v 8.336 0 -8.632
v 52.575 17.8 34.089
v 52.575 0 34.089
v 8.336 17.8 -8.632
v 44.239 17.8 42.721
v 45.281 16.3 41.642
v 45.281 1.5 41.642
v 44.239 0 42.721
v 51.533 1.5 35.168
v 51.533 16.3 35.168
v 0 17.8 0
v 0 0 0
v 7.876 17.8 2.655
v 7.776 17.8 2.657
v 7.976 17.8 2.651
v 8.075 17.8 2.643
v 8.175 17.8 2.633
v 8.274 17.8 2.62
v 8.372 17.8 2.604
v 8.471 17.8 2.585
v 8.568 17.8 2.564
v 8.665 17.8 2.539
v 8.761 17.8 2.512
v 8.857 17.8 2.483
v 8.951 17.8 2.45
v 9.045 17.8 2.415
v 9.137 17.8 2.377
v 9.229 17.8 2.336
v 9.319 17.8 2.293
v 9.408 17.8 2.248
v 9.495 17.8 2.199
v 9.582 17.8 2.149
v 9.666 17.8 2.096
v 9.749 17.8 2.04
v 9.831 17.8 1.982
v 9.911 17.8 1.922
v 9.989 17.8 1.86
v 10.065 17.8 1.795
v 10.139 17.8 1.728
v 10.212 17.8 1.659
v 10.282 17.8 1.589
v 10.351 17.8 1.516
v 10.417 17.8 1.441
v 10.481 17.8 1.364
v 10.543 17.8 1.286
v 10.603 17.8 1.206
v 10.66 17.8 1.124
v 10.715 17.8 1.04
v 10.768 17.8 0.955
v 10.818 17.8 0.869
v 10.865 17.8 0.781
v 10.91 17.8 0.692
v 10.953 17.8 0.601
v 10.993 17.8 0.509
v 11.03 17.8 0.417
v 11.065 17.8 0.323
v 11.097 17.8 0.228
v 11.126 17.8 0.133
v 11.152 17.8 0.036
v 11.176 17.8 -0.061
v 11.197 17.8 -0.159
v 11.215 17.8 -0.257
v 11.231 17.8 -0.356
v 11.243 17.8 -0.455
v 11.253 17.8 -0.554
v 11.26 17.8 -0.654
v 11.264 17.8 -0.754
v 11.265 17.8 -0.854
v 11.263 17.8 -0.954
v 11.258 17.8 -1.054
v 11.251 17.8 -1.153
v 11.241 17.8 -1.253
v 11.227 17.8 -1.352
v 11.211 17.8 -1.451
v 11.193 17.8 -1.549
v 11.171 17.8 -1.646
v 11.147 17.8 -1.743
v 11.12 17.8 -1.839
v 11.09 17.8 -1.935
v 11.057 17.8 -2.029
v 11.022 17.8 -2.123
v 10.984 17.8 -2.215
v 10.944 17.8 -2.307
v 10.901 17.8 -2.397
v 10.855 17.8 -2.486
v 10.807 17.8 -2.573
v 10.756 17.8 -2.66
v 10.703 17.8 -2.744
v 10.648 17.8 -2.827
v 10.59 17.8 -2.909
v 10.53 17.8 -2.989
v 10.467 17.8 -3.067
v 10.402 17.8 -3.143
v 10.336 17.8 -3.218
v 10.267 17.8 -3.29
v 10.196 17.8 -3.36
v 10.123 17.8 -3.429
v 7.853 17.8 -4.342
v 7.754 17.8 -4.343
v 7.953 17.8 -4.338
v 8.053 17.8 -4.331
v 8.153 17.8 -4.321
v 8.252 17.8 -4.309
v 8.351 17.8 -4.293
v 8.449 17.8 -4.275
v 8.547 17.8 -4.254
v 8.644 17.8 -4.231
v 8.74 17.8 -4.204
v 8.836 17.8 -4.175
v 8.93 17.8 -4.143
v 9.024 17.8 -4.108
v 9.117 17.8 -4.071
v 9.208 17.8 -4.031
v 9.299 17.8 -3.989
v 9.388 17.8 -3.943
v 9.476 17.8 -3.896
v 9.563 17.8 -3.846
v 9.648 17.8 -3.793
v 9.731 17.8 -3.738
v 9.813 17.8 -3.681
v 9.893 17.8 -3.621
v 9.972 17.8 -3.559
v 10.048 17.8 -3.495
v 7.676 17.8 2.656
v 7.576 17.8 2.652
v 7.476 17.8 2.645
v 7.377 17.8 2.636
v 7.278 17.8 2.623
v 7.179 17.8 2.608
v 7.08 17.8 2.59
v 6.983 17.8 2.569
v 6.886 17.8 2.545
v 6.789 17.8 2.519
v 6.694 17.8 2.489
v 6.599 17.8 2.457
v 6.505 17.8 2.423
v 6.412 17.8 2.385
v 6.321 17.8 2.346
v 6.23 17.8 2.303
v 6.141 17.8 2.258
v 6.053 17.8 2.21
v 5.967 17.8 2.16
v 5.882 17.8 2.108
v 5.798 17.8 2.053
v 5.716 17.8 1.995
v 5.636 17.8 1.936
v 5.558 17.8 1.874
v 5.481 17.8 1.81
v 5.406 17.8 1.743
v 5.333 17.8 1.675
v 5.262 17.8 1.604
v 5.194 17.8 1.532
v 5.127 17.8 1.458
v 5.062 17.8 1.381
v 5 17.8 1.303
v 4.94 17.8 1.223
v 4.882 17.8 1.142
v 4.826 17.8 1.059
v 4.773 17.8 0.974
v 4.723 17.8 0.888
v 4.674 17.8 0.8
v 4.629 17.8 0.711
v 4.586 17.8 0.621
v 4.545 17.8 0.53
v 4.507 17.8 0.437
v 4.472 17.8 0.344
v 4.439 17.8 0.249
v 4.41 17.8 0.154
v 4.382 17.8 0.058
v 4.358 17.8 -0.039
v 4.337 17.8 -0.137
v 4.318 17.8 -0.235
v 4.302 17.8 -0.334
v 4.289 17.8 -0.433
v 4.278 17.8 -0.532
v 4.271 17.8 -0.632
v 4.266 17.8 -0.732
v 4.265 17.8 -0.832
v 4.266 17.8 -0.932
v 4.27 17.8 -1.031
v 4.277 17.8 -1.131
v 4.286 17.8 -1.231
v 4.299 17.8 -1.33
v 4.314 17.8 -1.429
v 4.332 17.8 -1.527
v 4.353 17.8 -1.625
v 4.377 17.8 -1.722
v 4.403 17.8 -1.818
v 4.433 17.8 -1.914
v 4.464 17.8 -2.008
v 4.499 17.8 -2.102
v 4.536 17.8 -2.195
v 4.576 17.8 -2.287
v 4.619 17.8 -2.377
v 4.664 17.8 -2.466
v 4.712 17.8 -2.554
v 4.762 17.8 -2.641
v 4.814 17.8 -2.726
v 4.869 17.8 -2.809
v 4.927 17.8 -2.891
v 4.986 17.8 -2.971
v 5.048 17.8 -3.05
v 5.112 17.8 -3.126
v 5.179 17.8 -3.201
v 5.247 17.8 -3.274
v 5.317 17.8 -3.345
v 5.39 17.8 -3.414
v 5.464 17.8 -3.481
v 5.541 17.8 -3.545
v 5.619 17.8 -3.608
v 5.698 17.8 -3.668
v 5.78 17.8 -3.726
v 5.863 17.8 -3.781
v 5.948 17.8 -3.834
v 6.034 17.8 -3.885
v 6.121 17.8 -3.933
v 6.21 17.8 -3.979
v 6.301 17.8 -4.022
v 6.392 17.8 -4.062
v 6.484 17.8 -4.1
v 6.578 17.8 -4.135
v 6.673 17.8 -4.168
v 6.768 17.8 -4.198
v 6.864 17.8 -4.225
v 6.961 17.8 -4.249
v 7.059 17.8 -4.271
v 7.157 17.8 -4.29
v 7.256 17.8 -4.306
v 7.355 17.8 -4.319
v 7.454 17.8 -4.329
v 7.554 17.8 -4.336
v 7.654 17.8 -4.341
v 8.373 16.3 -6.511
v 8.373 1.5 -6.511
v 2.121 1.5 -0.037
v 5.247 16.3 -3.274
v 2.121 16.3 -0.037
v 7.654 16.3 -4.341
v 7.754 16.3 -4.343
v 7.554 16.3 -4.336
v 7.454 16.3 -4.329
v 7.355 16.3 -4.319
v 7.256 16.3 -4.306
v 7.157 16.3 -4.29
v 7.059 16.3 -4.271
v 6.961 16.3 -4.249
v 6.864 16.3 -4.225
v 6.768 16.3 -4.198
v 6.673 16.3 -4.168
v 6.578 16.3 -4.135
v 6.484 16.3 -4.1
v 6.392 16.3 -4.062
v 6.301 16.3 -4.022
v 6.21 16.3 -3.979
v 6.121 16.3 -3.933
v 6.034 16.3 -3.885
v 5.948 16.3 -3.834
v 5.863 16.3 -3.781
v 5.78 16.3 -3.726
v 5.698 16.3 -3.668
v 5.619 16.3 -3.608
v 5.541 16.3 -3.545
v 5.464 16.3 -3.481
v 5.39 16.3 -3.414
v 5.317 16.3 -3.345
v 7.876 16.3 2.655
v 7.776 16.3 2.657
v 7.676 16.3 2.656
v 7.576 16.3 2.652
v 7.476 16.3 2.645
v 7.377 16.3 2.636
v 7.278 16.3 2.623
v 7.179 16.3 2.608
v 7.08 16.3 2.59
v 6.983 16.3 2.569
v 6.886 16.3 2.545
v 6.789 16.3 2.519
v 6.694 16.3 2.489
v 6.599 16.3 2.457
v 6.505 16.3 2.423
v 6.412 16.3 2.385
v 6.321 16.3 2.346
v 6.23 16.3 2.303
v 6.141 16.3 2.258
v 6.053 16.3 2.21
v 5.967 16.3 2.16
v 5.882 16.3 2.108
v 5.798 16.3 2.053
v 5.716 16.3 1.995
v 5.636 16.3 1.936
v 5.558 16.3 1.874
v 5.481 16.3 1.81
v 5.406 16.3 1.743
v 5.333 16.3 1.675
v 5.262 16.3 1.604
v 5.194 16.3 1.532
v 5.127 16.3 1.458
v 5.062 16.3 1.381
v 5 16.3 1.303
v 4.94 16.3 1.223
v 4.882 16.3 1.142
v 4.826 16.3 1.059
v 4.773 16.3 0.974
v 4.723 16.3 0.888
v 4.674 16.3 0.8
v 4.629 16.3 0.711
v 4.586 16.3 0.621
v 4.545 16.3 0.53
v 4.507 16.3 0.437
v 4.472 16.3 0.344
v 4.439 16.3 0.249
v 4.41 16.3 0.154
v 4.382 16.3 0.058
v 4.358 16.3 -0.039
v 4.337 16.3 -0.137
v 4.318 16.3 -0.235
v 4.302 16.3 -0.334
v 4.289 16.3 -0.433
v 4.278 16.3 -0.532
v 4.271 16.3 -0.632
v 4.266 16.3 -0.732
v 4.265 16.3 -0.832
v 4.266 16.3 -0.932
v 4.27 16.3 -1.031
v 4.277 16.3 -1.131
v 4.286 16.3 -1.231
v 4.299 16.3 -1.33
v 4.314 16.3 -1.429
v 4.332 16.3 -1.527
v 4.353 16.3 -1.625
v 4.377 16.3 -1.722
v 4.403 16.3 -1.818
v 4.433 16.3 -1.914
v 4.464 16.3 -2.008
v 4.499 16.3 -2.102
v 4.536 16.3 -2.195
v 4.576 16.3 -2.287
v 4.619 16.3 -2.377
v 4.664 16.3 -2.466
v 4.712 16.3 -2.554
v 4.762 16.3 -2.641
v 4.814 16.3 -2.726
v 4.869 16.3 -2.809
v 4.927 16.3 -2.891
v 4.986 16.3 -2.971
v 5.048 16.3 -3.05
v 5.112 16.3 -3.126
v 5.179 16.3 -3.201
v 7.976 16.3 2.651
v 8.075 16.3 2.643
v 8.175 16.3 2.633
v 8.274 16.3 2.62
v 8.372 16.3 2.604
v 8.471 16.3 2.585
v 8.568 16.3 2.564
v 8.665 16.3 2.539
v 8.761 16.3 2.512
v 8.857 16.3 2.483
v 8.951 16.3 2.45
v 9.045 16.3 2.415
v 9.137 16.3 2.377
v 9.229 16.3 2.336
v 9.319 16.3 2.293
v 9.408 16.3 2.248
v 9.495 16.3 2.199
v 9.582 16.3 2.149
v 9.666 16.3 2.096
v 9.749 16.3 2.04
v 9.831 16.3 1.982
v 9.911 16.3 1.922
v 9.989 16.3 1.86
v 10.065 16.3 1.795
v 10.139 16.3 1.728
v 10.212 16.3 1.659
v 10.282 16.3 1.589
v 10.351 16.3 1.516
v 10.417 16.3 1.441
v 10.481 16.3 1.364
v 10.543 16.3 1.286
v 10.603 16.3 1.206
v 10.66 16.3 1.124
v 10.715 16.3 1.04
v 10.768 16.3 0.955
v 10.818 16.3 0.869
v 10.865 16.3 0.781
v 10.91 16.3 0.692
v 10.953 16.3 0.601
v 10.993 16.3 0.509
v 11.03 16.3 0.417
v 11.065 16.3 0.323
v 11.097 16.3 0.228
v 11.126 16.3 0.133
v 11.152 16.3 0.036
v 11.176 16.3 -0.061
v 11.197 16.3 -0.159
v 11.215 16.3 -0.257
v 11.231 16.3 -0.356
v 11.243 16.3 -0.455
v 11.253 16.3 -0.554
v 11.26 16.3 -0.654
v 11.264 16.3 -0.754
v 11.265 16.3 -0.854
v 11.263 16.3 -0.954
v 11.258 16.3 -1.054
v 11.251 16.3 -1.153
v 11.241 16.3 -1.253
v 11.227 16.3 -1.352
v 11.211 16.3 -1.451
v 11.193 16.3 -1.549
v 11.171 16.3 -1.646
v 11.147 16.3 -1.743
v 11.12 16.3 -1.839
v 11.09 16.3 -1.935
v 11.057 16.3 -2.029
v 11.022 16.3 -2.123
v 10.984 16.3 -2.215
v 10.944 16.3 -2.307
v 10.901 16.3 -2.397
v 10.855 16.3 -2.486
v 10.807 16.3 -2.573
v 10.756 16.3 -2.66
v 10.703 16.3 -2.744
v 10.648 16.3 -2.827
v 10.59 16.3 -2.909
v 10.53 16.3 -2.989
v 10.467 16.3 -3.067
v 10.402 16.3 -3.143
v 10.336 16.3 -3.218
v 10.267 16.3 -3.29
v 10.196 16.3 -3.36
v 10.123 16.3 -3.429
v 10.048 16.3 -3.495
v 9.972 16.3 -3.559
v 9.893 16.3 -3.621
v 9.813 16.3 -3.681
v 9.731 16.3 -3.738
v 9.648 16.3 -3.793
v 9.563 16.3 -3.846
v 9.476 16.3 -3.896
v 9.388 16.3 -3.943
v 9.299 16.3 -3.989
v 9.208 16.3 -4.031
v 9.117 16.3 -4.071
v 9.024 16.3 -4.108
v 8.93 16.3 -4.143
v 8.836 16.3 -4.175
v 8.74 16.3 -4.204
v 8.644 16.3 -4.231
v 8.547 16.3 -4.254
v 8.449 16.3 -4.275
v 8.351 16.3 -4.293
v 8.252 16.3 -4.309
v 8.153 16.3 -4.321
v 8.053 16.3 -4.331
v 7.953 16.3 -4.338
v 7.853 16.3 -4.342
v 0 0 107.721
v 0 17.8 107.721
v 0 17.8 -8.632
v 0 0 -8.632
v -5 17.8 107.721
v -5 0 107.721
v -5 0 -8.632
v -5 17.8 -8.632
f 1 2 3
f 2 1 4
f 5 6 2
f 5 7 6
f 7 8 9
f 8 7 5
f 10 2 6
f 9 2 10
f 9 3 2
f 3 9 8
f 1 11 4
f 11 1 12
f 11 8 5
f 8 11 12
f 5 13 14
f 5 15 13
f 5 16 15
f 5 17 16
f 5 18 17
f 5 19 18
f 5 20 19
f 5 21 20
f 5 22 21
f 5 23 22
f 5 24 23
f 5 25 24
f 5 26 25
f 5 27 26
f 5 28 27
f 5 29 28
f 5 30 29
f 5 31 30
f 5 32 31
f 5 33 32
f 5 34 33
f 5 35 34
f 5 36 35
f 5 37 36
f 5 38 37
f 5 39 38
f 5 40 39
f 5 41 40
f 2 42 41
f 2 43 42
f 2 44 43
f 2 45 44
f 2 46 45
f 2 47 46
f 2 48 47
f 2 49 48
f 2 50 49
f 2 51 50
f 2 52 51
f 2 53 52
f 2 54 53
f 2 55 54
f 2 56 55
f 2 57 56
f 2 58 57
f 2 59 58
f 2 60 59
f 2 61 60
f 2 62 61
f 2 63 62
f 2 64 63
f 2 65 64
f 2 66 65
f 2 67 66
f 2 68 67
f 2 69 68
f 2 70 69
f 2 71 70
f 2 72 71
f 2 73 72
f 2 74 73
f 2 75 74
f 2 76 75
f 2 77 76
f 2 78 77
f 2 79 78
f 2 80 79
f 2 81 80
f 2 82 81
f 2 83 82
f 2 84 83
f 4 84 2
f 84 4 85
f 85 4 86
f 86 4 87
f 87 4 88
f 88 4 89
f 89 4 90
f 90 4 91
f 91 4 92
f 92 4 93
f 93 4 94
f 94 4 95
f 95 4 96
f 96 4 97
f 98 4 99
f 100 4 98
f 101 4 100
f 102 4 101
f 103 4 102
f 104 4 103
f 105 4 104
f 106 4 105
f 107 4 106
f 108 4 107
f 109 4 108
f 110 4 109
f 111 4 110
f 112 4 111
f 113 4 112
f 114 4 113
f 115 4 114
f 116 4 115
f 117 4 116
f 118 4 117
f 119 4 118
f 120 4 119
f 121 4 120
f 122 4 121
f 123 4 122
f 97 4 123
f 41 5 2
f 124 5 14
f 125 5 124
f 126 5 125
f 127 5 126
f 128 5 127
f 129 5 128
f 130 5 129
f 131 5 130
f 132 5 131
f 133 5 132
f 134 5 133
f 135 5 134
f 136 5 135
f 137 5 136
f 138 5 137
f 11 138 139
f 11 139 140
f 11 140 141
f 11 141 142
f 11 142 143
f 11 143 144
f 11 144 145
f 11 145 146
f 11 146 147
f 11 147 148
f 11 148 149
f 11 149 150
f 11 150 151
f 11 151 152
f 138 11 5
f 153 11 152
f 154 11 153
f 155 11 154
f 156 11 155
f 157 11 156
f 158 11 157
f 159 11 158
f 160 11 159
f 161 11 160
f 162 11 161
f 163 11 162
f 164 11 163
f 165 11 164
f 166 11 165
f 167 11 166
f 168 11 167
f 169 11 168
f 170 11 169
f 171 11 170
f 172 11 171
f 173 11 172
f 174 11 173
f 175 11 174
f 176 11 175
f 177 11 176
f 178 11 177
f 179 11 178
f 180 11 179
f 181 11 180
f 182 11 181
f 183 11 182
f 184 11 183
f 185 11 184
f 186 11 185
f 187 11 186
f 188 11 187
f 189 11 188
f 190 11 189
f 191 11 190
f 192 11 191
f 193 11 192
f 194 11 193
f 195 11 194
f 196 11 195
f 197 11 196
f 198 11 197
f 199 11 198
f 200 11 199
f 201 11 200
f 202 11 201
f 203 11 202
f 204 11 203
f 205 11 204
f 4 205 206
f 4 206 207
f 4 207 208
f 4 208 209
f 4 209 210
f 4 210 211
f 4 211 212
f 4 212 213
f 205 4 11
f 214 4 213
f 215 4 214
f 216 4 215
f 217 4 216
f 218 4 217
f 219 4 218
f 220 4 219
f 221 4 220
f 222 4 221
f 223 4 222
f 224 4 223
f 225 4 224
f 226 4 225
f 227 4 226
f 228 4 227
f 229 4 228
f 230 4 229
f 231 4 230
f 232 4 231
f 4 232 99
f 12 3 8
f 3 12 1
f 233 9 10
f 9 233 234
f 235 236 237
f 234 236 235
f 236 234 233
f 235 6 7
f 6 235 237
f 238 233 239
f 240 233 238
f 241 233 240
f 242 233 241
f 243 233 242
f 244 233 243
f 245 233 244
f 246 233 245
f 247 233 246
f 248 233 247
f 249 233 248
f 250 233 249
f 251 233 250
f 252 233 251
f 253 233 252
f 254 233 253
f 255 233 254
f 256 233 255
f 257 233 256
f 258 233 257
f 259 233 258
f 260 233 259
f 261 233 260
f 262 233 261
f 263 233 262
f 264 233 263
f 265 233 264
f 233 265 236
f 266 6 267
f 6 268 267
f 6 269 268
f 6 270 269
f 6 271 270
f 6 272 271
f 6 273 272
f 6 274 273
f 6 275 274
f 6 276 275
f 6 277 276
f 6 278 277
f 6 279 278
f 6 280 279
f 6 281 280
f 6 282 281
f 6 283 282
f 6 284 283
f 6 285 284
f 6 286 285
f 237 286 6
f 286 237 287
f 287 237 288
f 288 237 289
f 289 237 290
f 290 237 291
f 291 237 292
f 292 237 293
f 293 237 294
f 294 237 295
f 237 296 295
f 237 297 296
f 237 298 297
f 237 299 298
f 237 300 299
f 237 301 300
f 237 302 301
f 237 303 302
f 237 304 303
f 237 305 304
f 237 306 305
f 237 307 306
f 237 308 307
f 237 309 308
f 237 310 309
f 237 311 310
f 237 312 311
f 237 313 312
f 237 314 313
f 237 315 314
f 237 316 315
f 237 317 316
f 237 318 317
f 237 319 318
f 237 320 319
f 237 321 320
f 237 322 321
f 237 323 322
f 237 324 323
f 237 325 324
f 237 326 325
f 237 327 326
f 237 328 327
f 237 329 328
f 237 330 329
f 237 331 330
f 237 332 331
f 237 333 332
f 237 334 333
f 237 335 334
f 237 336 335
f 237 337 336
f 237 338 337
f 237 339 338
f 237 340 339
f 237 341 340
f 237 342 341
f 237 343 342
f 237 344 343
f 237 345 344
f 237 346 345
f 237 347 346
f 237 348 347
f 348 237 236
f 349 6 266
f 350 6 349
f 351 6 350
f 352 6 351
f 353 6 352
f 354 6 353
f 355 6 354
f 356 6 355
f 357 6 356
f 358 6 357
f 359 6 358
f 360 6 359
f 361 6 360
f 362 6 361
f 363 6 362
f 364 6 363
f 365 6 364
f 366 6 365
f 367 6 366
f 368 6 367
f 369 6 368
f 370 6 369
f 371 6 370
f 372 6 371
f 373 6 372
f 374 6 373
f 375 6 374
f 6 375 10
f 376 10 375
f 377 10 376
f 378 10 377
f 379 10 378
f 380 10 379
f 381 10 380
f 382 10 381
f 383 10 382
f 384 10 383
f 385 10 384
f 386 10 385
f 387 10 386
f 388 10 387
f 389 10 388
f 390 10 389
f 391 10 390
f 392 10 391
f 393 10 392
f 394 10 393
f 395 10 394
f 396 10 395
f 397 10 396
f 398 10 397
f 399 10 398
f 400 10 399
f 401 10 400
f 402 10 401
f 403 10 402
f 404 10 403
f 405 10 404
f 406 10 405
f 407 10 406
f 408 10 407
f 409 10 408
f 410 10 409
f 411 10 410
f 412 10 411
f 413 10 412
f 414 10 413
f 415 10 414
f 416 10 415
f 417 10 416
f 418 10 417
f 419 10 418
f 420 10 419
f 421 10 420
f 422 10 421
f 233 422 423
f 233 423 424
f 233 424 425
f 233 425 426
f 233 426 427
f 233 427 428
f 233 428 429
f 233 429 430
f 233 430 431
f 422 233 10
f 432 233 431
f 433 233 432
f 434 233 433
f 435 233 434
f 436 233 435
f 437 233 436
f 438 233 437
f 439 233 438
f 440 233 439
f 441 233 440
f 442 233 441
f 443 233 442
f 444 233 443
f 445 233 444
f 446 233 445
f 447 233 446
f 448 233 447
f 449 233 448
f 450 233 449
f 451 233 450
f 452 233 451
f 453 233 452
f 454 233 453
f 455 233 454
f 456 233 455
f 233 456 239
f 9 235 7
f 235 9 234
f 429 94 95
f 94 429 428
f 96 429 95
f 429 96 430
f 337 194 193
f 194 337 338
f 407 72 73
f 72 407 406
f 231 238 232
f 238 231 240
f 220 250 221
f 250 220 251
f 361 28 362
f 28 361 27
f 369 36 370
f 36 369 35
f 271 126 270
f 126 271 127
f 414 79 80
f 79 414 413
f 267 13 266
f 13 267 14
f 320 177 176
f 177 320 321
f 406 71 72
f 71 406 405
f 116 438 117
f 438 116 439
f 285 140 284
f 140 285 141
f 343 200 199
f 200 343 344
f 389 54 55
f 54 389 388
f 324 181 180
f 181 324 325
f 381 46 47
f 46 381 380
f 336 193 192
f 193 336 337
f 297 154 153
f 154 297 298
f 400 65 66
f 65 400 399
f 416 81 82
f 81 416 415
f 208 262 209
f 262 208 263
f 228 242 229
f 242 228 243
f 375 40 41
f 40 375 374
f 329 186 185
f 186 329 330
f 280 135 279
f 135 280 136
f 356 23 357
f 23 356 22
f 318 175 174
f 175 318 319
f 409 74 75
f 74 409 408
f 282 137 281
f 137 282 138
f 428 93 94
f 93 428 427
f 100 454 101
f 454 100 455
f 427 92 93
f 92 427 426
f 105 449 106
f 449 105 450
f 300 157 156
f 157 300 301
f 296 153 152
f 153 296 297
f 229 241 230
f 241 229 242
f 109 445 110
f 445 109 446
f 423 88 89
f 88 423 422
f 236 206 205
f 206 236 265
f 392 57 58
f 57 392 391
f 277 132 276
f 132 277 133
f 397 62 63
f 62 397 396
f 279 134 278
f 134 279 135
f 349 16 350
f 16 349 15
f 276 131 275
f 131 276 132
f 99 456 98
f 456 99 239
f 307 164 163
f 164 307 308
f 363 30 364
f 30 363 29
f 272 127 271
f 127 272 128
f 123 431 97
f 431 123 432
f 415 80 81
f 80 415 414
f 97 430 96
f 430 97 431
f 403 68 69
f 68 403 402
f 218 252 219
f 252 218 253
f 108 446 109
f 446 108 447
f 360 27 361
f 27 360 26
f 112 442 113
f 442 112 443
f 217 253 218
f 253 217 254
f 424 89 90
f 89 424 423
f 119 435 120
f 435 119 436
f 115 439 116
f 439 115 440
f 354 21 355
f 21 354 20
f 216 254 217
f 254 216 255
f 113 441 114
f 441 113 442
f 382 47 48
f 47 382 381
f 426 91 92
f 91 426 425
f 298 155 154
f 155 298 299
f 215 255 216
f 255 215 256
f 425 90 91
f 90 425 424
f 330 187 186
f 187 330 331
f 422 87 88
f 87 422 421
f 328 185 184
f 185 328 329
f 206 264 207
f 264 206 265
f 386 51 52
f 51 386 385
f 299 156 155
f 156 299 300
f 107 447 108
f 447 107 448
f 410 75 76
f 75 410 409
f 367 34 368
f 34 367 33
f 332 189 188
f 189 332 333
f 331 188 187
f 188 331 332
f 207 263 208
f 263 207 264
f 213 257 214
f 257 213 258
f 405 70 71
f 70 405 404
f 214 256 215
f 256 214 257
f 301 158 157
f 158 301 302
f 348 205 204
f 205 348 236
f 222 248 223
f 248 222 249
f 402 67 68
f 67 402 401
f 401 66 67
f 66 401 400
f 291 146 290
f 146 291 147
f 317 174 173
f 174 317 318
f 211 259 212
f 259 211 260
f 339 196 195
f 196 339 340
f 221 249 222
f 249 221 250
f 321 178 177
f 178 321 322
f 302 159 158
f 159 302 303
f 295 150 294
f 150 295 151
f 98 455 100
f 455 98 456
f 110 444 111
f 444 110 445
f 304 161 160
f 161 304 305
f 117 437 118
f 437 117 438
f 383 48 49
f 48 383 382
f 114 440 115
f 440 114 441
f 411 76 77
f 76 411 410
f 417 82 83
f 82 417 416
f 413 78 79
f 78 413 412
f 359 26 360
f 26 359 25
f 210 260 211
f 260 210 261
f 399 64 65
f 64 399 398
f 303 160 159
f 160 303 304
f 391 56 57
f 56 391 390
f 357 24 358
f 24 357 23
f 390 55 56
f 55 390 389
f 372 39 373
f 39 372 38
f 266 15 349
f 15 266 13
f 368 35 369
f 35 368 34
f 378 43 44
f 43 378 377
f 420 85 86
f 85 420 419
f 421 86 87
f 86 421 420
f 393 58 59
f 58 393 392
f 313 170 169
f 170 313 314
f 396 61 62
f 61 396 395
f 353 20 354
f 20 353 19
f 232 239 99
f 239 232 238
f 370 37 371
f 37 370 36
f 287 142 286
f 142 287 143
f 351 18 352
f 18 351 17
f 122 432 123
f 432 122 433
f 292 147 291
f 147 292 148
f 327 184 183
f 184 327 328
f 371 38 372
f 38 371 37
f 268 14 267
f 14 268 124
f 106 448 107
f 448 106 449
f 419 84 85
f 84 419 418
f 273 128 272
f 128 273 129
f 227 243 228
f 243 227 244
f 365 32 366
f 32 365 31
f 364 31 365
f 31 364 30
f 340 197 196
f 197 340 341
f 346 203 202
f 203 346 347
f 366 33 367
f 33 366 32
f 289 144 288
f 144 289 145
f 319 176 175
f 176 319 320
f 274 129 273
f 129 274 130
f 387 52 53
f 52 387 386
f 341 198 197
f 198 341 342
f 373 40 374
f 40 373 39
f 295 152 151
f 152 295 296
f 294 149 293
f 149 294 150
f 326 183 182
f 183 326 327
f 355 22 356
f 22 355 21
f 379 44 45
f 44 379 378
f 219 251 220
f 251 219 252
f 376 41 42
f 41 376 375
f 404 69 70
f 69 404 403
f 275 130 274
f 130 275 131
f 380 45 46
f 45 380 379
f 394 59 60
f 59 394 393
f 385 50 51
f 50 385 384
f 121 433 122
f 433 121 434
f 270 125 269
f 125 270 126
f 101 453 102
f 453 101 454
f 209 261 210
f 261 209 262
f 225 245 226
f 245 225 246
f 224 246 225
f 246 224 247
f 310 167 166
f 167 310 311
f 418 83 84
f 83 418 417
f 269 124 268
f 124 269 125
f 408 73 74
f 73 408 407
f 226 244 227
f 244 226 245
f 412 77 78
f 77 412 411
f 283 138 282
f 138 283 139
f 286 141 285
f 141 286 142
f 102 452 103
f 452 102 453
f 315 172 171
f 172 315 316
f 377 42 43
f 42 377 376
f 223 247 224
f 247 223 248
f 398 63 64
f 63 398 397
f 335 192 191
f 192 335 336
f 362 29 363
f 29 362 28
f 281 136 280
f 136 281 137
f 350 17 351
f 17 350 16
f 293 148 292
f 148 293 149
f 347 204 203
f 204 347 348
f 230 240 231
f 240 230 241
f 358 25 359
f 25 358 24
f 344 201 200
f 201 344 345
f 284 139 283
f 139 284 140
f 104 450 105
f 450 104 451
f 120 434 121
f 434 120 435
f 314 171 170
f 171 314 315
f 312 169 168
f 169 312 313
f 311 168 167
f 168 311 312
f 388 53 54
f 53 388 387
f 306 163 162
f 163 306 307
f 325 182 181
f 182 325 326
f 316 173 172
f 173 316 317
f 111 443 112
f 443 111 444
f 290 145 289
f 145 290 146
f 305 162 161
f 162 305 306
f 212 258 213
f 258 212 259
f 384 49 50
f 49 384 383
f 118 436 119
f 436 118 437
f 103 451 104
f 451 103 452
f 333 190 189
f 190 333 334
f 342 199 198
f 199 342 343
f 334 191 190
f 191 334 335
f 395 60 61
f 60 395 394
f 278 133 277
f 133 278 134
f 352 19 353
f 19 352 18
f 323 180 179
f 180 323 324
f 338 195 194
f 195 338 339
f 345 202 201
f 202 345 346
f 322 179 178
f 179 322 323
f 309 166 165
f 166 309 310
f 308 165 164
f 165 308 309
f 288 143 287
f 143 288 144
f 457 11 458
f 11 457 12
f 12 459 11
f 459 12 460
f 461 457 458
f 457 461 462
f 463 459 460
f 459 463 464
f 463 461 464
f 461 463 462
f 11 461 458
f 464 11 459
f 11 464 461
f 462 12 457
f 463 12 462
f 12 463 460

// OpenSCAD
$fa = 0.1;
$fs = 0.1;

sensor_width = 49.5+0.5+10;
sensor_height = 14.3+0.5;
sensor_depth = 8.5+0.5;
min_border_width = 1.5;

cable_diameter = 7;
rise_degrees = 46;

sensor_case_width = sensor_width+min_border_width;
sensor_case_height = sensor_height+2*min_border_width;
sensor_case_depth = sensor_depth+2*min_border_width;
module sensor_case() {
	rotate([0, rise_degrees, 0])
	difference() {
		cube([sensor_case_depth, sensor_case_height, sensor_case_width]);
		
		translate([min_border_width, min_border_width, min_border_width])
			cube([sensor_depth, sensor_height, sensor_width+0.01]);
			
		translate([sensor_case_depth/2, sensor_case_height+0.01, cable_diameter/2+min_border_width])
		rotate([90, 0, 0])
			cylinder(d=cable_diameter, h=min_border_width+0.02);
	}
}

upper_shape_width = sensor_case_width * sin(rise_degrees);
upper_shape_height = sensor_case_width * cos(rise_degrees);

// color("green")
// translate([0, sensor_case_height, 0])
// rotate([90, 0, 0])
// linear_extrude(sensor_case_height)
// 	polygon([[0, -0.01], [upper_shape_width+0.01, upper_shape_height], [0, upper_shape_height]]);

lower_shape_width = sensor_case_depth * sin(90-rise_degrees);
lower_shape_height = sensor_case_depth * cos(90-rise_degrees);

// color("green")
// translate([0, sensor_case_height, 0])
// rotate([90, 0, 0])
// linear_extrude(sensor_case_height)
// 	polygon([[0, 0.01], [0, -lower_shape_height], [lower_shape_width+0.01, -lower_shape_height]]);

sensor_case();

translate([-5, 0, -lower_shape_height])
	cube([5, sensor_case_height, lower_shape_height+upper_shape_height+65]);
